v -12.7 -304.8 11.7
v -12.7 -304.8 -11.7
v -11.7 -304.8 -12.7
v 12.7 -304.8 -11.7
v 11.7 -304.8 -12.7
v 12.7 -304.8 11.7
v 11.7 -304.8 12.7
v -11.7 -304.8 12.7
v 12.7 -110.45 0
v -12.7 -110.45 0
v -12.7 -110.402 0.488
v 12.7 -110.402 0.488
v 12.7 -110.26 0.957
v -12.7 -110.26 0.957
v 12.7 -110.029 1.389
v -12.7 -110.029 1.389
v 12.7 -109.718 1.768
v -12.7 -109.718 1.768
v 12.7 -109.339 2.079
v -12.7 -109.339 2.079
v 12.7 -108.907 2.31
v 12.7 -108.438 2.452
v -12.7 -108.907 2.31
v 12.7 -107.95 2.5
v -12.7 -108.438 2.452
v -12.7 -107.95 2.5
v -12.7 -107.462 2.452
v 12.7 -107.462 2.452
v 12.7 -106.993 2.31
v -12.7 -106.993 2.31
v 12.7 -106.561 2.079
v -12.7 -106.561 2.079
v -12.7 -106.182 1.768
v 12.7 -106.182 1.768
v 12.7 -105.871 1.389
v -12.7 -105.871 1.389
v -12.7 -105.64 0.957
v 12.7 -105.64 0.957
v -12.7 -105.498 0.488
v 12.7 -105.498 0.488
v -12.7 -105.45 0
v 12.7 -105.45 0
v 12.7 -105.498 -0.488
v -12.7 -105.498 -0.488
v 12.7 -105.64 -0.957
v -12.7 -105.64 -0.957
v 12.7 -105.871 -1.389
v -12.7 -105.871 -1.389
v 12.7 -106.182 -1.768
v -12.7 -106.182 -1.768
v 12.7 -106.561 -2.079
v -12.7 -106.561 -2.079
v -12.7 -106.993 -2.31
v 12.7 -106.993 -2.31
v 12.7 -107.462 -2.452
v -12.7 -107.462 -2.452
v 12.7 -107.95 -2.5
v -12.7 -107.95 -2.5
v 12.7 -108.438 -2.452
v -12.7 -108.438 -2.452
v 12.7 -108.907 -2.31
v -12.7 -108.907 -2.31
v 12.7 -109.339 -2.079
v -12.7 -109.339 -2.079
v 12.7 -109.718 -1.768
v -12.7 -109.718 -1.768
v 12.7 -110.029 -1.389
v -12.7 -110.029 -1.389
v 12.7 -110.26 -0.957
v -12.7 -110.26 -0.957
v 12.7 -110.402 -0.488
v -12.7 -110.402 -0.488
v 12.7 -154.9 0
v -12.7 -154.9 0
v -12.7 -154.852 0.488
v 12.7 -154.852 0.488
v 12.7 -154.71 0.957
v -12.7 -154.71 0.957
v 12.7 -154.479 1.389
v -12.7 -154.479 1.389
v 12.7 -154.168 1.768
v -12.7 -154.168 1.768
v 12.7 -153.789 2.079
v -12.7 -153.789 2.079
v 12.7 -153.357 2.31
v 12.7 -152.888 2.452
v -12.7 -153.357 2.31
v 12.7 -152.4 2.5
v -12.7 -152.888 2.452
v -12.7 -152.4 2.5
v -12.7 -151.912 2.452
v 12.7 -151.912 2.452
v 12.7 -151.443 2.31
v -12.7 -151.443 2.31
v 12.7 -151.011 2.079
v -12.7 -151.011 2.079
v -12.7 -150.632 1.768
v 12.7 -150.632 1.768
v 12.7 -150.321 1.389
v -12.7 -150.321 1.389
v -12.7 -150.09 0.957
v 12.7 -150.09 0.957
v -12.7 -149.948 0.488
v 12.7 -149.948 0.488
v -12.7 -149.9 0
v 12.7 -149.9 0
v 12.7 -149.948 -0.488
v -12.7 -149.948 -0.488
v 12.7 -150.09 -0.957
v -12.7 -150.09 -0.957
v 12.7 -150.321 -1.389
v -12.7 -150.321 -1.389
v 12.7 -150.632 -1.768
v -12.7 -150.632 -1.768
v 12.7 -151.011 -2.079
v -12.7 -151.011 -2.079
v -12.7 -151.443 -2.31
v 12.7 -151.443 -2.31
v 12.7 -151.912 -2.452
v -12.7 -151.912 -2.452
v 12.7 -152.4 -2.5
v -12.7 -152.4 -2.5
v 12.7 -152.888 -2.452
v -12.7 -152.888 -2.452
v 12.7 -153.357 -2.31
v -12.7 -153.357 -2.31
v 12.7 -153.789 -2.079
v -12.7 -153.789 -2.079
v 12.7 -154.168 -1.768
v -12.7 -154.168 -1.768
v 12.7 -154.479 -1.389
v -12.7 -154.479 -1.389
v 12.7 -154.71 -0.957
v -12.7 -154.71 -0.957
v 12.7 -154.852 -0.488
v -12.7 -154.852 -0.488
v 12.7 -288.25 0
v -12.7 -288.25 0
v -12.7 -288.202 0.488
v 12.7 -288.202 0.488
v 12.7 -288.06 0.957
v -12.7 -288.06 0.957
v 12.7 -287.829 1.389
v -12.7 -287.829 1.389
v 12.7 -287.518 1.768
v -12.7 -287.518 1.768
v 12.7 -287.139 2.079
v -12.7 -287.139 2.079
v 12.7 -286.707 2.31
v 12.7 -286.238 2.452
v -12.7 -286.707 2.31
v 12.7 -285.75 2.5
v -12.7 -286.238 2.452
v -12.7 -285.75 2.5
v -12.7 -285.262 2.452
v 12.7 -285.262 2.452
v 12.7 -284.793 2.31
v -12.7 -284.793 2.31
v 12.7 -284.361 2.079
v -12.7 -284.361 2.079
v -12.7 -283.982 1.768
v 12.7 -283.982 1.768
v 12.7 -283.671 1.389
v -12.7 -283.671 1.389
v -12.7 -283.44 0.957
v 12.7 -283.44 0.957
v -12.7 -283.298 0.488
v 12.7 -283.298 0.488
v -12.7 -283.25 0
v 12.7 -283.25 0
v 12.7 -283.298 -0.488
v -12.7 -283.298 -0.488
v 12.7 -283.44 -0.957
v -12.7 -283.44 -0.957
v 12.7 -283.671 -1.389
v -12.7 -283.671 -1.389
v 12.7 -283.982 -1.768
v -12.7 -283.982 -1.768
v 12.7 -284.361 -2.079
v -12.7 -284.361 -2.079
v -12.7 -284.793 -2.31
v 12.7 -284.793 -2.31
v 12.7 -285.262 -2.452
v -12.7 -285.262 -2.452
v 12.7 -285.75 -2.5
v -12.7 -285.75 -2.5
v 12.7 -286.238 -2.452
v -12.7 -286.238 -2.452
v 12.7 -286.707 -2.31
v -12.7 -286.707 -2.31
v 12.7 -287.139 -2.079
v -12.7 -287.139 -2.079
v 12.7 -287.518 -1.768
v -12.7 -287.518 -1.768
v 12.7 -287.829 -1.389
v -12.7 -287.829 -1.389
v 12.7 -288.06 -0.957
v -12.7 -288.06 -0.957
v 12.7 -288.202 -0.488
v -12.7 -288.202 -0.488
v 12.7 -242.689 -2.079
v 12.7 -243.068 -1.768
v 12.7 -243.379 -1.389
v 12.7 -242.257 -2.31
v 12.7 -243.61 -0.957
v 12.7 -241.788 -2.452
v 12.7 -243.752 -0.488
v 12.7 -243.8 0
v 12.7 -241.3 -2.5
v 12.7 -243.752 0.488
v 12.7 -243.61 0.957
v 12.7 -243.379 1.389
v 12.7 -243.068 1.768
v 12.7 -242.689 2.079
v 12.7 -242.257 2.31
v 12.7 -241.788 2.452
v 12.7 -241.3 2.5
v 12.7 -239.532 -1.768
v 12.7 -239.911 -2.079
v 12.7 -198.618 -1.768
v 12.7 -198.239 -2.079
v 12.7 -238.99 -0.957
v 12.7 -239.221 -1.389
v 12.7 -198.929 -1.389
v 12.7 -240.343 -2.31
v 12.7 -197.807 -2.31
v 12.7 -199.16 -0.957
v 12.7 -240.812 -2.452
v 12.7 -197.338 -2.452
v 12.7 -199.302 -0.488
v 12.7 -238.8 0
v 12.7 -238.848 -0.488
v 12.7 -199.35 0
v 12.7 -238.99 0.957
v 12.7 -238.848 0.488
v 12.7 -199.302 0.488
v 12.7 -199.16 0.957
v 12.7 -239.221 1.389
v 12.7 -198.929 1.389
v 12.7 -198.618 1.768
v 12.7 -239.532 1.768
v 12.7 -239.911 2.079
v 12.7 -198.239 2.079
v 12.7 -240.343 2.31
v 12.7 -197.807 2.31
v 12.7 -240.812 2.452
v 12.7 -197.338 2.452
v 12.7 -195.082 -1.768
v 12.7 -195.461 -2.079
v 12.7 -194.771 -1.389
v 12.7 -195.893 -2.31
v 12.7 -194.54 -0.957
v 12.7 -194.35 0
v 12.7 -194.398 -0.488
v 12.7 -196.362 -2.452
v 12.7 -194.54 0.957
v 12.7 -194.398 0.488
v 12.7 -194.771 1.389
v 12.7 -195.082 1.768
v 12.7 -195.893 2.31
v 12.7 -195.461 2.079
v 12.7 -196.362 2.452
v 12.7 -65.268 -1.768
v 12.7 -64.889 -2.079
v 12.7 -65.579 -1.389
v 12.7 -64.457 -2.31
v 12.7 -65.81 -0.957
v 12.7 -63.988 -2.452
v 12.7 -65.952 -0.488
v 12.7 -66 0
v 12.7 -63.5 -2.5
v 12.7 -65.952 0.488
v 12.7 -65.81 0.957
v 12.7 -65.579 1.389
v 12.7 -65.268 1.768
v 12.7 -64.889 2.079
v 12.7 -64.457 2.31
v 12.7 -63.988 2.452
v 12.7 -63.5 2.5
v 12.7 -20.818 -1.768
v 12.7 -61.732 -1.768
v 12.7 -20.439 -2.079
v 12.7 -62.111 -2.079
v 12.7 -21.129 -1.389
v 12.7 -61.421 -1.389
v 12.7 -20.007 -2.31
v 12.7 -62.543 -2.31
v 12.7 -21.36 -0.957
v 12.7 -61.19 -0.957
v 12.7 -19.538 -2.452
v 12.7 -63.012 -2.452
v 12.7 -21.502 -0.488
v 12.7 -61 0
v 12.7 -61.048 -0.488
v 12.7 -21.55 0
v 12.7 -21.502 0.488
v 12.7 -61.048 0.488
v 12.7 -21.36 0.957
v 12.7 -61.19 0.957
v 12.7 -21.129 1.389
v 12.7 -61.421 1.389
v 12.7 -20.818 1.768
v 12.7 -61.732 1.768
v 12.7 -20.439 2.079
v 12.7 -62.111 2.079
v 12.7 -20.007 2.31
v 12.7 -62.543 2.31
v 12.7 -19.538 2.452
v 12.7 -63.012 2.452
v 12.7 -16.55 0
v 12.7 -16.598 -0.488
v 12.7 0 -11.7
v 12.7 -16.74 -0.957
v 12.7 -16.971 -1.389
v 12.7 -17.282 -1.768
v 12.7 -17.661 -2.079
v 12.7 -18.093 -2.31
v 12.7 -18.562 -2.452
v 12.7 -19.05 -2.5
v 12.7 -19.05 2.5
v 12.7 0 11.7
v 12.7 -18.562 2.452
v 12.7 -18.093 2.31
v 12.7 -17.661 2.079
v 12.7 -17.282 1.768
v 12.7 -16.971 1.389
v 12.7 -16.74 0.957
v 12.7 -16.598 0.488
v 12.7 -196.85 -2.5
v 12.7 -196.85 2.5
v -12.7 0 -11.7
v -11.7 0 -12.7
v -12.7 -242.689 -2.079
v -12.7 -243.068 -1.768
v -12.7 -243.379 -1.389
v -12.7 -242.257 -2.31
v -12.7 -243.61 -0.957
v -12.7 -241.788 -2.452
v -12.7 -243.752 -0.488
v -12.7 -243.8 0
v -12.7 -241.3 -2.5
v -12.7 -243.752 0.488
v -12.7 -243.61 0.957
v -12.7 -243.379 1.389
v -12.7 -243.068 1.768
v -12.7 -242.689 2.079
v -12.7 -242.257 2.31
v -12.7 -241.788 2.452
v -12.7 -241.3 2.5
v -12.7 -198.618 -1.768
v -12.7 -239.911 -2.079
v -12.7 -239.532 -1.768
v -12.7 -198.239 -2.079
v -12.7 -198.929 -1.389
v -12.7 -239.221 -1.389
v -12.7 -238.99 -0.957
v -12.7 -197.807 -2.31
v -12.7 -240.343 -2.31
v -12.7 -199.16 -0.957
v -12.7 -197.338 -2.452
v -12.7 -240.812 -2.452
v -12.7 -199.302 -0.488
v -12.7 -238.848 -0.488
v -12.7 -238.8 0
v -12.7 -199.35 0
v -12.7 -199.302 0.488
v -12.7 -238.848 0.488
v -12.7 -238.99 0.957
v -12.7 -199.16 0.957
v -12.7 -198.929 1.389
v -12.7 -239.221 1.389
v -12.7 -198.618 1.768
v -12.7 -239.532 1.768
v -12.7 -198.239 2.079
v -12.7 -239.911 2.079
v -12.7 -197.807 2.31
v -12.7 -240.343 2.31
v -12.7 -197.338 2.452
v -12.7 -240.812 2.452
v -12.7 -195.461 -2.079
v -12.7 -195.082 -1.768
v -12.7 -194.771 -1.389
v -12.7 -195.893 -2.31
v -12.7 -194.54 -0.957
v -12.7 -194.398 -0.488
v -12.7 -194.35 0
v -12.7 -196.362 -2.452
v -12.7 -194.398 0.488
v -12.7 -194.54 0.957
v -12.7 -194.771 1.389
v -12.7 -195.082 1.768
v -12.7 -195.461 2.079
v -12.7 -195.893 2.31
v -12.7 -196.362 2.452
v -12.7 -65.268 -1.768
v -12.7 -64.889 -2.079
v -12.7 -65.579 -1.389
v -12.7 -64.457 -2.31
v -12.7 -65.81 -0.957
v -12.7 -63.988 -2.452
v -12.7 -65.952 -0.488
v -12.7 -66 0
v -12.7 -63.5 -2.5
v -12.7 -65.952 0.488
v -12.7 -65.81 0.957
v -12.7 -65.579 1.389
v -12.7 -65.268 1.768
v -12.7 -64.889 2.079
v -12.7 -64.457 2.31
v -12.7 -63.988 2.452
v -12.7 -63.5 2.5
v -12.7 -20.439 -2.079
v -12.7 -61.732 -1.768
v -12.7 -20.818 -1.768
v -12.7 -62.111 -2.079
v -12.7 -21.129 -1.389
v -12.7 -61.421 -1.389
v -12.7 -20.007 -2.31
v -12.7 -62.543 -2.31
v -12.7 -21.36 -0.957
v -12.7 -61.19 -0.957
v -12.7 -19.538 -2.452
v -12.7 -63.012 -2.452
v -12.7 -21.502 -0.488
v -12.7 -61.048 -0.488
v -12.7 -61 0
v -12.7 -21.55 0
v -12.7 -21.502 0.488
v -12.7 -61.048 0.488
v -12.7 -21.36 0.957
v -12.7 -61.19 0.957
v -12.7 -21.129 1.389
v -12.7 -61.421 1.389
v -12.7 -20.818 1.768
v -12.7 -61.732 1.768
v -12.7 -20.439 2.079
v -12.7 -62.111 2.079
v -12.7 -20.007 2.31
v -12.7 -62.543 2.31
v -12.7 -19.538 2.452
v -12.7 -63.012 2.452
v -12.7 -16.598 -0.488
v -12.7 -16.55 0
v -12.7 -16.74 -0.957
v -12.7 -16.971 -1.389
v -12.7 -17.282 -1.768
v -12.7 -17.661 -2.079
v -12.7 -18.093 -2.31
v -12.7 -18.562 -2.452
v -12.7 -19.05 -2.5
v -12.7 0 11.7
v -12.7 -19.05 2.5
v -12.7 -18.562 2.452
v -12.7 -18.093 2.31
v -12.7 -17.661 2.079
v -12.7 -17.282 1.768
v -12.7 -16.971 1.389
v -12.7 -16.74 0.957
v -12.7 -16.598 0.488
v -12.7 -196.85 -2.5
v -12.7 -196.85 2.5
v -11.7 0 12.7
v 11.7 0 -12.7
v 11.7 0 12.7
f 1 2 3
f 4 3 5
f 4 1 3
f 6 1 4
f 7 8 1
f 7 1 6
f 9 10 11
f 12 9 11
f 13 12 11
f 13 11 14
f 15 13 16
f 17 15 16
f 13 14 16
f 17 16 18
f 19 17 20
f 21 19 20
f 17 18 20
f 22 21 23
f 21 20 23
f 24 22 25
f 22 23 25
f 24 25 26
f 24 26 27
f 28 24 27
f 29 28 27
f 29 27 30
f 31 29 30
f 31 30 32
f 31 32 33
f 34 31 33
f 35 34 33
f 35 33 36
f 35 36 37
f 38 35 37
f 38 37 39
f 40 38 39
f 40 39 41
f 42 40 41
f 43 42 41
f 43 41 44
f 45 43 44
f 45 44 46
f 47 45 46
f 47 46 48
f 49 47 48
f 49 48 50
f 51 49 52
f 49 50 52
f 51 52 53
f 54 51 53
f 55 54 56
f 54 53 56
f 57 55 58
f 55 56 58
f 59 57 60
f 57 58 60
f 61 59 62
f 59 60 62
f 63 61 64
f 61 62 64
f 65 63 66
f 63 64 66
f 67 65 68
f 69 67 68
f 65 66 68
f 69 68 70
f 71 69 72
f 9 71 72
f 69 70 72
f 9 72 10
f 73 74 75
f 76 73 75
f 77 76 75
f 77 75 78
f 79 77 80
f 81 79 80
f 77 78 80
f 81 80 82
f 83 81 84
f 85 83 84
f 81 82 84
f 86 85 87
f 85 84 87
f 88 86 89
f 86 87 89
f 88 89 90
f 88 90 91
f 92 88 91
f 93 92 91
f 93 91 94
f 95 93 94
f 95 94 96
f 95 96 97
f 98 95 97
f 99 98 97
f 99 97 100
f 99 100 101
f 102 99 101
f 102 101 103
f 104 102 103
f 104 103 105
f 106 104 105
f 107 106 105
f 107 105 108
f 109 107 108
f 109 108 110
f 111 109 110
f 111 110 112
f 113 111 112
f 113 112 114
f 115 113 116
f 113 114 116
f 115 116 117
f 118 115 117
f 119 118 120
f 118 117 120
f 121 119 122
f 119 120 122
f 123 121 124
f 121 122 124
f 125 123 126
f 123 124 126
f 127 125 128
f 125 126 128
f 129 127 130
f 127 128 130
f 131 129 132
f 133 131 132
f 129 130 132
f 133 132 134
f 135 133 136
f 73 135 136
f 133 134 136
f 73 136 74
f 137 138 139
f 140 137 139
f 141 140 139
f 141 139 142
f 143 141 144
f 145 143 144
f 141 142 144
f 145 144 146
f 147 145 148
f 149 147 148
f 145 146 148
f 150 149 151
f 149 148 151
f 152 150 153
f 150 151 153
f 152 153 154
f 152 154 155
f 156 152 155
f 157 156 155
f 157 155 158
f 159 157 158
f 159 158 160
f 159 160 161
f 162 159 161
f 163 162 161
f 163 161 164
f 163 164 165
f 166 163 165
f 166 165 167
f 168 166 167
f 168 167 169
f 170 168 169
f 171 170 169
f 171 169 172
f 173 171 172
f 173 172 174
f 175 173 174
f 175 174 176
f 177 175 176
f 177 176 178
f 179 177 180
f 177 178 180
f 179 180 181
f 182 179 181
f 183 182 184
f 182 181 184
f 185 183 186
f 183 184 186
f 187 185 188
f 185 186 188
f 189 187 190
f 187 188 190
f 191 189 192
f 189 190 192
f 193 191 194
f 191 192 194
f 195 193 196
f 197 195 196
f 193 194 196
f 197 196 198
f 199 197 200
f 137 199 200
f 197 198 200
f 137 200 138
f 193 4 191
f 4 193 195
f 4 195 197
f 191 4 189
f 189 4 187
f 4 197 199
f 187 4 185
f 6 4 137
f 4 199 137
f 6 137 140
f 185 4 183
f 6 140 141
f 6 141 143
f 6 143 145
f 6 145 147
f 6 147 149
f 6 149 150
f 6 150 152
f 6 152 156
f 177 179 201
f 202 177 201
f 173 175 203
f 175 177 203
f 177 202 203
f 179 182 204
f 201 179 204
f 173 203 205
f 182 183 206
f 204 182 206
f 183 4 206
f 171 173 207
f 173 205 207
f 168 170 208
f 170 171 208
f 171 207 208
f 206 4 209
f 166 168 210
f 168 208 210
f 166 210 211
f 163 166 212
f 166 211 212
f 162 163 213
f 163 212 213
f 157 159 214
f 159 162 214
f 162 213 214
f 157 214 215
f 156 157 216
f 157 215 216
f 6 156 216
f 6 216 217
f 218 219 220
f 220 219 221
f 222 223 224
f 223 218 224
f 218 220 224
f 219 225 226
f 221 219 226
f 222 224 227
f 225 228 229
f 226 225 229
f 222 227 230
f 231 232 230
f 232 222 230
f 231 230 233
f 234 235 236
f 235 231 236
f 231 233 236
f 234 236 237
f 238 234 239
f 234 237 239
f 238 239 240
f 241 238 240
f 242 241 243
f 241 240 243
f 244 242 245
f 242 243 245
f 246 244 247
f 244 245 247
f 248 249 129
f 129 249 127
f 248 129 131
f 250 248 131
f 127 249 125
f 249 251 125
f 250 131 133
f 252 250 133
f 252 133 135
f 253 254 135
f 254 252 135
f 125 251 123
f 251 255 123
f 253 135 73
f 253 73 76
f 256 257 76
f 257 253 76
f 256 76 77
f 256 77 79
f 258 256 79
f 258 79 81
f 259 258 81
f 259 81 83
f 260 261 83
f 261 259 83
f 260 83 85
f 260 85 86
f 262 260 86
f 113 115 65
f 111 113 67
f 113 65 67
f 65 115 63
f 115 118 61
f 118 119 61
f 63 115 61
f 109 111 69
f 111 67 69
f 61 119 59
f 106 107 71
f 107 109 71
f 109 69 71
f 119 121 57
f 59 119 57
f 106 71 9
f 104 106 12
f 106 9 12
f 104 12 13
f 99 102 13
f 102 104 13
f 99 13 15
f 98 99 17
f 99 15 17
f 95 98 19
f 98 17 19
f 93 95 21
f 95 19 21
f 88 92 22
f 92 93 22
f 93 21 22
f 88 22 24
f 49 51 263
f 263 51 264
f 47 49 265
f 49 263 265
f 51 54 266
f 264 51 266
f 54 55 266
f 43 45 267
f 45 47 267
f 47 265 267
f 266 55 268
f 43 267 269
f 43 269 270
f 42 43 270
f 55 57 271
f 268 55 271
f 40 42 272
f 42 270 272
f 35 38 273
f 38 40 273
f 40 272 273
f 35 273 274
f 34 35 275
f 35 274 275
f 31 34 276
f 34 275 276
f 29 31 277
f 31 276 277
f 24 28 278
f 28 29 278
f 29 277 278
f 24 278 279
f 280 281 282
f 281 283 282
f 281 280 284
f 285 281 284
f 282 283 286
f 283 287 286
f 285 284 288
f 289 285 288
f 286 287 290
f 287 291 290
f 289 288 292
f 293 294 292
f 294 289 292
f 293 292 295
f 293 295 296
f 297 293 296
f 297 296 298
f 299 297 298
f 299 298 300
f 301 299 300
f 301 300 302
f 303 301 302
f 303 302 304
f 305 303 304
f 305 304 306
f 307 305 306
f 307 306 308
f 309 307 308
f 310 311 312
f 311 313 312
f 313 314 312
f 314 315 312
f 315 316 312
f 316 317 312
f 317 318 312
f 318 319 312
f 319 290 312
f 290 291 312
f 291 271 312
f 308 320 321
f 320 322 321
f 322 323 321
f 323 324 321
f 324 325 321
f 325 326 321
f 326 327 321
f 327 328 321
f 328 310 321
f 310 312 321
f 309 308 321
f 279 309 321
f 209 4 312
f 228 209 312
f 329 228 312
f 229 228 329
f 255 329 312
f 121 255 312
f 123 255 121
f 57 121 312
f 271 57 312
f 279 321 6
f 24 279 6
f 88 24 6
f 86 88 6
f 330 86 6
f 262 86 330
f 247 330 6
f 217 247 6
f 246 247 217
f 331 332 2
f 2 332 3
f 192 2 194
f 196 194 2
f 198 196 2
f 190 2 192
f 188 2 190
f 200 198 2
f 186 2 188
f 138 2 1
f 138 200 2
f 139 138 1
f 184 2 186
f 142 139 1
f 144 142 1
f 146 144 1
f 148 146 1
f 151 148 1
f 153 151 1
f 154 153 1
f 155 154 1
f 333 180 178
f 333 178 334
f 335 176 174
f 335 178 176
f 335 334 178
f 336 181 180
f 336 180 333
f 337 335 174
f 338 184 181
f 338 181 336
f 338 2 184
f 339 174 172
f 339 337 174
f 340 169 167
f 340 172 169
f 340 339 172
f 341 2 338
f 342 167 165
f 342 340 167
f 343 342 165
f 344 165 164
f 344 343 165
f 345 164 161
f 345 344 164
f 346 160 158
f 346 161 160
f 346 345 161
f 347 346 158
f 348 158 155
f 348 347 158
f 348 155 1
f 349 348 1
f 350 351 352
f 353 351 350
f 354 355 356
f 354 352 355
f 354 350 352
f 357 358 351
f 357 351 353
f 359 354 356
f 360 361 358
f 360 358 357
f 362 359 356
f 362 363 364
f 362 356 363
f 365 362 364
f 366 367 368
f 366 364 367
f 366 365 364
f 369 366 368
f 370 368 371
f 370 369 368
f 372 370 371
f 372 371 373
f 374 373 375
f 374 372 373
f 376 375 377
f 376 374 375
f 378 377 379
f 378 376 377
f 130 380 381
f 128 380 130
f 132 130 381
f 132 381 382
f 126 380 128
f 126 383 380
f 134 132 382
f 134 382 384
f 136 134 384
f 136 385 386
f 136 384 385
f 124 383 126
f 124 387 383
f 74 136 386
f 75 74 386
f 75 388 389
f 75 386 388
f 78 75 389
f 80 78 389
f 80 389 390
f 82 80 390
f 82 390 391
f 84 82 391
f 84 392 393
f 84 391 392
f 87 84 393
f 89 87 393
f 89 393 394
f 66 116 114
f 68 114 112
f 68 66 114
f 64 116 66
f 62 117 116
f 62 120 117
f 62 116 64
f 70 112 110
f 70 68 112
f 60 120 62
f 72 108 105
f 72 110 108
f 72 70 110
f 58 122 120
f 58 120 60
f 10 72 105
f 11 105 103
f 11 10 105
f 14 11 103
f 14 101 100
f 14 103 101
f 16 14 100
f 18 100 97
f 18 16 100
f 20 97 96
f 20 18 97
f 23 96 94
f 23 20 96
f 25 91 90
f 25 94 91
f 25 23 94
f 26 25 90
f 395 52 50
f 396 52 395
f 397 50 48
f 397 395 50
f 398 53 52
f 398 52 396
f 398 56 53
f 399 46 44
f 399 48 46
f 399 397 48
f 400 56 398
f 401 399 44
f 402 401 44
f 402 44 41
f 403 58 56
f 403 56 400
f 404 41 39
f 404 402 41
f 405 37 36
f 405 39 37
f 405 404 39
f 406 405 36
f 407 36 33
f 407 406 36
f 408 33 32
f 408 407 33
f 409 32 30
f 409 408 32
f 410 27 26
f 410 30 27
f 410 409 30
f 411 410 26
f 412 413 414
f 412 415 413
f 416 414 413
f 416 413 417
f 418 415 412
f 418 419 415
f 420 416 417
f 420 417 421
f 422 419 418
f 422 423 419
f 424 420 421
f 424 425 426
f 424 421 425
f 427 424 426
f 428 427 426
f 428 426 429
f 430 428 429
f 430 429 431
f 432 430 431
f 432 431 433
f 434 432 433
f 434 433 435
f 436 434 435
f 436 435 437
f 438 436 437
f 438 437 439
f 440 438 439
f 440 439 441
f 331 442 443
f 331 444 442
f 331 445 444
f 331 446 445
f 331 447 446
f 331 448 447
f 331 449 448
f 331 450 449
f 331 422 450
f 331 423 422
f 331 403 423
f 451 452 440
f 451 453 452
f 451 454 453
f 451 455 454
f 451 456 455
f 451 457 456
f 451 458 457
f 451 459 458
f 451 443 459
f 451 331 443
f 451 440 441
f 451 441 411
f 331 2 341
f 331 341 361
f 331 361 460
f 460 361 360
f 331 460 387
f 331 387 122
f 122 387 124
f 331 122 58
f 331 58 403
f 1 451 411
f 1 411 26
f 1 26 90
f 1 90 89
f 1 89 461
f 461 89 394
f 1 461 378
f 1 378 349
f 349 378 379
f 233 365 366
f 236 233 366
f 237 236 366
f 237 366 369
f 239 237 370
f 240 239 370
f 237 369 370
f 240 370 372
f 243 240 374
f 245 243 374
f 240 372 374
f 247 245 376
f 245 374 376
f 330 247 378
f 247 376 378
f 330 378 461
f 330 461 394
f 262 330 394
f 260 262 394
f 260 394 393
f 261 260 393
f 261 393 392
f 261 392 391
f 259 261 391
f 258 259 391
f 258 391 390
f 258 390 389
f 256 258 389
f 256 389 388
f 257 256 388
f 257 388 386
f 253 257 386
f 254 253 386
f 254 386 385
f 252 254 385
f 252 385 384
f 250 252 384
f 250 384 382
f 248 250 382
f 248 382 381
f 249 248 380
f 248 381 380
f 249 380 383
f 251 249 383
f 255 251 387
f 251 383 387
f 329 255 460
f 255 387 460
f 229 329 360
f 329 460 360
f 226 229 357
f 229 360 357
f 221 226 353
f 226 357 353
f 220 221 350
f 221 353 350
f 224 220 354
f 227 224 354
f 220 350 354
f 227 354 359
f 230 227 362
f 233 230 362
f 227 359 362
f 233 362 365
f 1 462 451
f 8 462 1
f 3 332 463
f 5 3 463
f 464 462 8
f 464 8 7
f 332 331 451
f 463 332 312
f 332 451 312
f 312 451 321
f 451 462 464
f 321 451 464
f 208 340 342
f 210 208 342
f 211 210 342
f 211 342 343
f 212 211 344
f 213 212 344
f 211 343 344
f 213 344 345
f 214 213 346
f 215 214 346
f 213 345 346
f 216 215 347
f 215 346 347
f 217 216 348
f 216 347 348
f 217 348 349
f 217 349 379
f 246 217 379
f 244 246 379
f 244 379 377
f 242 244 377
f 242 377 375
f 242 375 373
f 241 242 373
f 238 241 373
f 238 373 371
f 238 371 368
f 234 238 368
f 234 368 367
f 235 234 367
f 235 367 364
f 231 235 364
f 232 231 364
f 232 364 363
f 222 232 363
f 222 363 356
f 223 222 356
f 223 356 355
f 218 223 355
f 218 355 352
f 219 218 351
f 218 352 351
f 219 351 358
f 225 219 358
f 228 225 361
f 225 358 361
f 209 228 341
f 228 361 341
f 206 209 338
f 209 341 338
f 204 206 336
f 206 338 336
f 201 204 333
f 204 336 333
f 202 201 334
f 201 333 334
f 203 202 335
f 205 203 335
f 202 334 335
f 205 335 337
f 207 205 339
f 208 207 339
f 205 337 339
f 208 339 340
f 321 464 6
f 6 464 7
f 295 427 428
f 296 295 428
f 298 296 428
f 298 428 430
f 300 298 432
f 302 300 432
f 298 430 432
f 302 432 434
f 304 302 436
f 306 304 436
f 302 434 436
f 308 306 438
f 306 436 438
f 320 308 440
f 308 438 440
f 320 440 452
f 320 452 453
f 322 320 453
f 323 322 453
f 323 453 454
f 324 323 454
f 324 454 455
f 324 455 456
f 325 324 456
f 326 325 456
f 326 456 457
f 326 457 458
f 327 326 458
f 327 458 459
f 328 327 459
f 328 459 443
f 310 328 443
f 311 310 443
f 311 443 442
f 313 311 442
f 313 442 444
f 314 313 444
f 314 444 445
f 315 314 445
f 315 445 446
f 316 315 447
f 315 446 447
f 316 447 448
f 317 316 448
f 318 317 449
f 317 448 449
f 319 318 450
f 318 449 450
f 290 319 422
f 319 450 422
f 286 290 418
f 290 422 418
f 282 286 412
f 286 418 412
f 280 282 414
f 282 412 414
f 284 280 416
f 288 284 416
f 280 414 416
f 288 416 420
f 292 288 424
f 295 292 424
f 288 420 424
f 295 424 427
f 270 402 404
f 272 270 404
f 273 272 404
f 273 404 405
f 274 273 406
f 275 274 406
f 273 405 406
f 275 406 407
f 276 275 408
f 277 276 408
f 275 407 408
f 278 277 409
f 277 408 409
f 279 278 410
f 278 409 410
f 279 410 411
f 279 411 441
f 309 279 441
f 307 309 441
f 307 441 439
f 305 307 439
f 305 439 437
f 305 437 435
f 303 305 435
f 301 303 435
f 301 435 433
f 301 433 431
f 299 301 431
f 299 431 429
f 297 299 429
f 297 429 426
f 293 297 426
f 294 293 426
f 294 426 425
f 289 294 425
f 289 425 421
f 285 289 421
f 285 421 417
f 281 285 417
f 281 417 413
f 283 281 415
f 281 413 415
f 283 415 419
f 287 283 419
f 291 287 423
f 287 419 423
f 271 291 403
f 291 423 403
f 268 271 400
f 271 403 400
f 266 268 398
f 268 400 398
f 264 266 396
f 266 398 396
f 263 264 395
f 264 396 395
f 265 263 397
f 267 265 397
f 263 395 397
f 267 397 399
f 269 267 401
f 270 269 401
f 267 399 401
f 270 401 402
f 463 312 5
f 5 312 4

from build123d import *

# Parameters (mm, degrees)
F0_W     = 25.4
F0_H     = 25.4
F1_DEPTH = 304.8
F2_SIZE  = 1
F4_D     = 5


with BuildPart() as f1:
    # F0 (on Front) → F1 (new body)
    with BuildSketch(Plane.XZ):
        Rectangle(F0_W, F0_H)
    extrude(amount=F1_DEPTH)

    # F2
    f2_edges = [f1.edges().sort_by_distance(p)[0] for p in [
        (12.7, -152.4, 12.7),
        (12.7, -152.4, -12.7),
        (-12.7, -152.4, 12.7),
        (-12.7, -152.4, -12.7),
    ]]
    chamfer(f2_edges, length=F2_SIZE)

    # F4 (through all)
    with Locations(Plane.YZ.offset(12.7)):
        with Locations((-285.75, 0), (-241.3, 0), (-196.85, 0), (-152.4, 0), (-107.95, 0), (-63.5, 0), (-19.05, 0)):
            Hole(F4_D / 2)


solid = f1.part
